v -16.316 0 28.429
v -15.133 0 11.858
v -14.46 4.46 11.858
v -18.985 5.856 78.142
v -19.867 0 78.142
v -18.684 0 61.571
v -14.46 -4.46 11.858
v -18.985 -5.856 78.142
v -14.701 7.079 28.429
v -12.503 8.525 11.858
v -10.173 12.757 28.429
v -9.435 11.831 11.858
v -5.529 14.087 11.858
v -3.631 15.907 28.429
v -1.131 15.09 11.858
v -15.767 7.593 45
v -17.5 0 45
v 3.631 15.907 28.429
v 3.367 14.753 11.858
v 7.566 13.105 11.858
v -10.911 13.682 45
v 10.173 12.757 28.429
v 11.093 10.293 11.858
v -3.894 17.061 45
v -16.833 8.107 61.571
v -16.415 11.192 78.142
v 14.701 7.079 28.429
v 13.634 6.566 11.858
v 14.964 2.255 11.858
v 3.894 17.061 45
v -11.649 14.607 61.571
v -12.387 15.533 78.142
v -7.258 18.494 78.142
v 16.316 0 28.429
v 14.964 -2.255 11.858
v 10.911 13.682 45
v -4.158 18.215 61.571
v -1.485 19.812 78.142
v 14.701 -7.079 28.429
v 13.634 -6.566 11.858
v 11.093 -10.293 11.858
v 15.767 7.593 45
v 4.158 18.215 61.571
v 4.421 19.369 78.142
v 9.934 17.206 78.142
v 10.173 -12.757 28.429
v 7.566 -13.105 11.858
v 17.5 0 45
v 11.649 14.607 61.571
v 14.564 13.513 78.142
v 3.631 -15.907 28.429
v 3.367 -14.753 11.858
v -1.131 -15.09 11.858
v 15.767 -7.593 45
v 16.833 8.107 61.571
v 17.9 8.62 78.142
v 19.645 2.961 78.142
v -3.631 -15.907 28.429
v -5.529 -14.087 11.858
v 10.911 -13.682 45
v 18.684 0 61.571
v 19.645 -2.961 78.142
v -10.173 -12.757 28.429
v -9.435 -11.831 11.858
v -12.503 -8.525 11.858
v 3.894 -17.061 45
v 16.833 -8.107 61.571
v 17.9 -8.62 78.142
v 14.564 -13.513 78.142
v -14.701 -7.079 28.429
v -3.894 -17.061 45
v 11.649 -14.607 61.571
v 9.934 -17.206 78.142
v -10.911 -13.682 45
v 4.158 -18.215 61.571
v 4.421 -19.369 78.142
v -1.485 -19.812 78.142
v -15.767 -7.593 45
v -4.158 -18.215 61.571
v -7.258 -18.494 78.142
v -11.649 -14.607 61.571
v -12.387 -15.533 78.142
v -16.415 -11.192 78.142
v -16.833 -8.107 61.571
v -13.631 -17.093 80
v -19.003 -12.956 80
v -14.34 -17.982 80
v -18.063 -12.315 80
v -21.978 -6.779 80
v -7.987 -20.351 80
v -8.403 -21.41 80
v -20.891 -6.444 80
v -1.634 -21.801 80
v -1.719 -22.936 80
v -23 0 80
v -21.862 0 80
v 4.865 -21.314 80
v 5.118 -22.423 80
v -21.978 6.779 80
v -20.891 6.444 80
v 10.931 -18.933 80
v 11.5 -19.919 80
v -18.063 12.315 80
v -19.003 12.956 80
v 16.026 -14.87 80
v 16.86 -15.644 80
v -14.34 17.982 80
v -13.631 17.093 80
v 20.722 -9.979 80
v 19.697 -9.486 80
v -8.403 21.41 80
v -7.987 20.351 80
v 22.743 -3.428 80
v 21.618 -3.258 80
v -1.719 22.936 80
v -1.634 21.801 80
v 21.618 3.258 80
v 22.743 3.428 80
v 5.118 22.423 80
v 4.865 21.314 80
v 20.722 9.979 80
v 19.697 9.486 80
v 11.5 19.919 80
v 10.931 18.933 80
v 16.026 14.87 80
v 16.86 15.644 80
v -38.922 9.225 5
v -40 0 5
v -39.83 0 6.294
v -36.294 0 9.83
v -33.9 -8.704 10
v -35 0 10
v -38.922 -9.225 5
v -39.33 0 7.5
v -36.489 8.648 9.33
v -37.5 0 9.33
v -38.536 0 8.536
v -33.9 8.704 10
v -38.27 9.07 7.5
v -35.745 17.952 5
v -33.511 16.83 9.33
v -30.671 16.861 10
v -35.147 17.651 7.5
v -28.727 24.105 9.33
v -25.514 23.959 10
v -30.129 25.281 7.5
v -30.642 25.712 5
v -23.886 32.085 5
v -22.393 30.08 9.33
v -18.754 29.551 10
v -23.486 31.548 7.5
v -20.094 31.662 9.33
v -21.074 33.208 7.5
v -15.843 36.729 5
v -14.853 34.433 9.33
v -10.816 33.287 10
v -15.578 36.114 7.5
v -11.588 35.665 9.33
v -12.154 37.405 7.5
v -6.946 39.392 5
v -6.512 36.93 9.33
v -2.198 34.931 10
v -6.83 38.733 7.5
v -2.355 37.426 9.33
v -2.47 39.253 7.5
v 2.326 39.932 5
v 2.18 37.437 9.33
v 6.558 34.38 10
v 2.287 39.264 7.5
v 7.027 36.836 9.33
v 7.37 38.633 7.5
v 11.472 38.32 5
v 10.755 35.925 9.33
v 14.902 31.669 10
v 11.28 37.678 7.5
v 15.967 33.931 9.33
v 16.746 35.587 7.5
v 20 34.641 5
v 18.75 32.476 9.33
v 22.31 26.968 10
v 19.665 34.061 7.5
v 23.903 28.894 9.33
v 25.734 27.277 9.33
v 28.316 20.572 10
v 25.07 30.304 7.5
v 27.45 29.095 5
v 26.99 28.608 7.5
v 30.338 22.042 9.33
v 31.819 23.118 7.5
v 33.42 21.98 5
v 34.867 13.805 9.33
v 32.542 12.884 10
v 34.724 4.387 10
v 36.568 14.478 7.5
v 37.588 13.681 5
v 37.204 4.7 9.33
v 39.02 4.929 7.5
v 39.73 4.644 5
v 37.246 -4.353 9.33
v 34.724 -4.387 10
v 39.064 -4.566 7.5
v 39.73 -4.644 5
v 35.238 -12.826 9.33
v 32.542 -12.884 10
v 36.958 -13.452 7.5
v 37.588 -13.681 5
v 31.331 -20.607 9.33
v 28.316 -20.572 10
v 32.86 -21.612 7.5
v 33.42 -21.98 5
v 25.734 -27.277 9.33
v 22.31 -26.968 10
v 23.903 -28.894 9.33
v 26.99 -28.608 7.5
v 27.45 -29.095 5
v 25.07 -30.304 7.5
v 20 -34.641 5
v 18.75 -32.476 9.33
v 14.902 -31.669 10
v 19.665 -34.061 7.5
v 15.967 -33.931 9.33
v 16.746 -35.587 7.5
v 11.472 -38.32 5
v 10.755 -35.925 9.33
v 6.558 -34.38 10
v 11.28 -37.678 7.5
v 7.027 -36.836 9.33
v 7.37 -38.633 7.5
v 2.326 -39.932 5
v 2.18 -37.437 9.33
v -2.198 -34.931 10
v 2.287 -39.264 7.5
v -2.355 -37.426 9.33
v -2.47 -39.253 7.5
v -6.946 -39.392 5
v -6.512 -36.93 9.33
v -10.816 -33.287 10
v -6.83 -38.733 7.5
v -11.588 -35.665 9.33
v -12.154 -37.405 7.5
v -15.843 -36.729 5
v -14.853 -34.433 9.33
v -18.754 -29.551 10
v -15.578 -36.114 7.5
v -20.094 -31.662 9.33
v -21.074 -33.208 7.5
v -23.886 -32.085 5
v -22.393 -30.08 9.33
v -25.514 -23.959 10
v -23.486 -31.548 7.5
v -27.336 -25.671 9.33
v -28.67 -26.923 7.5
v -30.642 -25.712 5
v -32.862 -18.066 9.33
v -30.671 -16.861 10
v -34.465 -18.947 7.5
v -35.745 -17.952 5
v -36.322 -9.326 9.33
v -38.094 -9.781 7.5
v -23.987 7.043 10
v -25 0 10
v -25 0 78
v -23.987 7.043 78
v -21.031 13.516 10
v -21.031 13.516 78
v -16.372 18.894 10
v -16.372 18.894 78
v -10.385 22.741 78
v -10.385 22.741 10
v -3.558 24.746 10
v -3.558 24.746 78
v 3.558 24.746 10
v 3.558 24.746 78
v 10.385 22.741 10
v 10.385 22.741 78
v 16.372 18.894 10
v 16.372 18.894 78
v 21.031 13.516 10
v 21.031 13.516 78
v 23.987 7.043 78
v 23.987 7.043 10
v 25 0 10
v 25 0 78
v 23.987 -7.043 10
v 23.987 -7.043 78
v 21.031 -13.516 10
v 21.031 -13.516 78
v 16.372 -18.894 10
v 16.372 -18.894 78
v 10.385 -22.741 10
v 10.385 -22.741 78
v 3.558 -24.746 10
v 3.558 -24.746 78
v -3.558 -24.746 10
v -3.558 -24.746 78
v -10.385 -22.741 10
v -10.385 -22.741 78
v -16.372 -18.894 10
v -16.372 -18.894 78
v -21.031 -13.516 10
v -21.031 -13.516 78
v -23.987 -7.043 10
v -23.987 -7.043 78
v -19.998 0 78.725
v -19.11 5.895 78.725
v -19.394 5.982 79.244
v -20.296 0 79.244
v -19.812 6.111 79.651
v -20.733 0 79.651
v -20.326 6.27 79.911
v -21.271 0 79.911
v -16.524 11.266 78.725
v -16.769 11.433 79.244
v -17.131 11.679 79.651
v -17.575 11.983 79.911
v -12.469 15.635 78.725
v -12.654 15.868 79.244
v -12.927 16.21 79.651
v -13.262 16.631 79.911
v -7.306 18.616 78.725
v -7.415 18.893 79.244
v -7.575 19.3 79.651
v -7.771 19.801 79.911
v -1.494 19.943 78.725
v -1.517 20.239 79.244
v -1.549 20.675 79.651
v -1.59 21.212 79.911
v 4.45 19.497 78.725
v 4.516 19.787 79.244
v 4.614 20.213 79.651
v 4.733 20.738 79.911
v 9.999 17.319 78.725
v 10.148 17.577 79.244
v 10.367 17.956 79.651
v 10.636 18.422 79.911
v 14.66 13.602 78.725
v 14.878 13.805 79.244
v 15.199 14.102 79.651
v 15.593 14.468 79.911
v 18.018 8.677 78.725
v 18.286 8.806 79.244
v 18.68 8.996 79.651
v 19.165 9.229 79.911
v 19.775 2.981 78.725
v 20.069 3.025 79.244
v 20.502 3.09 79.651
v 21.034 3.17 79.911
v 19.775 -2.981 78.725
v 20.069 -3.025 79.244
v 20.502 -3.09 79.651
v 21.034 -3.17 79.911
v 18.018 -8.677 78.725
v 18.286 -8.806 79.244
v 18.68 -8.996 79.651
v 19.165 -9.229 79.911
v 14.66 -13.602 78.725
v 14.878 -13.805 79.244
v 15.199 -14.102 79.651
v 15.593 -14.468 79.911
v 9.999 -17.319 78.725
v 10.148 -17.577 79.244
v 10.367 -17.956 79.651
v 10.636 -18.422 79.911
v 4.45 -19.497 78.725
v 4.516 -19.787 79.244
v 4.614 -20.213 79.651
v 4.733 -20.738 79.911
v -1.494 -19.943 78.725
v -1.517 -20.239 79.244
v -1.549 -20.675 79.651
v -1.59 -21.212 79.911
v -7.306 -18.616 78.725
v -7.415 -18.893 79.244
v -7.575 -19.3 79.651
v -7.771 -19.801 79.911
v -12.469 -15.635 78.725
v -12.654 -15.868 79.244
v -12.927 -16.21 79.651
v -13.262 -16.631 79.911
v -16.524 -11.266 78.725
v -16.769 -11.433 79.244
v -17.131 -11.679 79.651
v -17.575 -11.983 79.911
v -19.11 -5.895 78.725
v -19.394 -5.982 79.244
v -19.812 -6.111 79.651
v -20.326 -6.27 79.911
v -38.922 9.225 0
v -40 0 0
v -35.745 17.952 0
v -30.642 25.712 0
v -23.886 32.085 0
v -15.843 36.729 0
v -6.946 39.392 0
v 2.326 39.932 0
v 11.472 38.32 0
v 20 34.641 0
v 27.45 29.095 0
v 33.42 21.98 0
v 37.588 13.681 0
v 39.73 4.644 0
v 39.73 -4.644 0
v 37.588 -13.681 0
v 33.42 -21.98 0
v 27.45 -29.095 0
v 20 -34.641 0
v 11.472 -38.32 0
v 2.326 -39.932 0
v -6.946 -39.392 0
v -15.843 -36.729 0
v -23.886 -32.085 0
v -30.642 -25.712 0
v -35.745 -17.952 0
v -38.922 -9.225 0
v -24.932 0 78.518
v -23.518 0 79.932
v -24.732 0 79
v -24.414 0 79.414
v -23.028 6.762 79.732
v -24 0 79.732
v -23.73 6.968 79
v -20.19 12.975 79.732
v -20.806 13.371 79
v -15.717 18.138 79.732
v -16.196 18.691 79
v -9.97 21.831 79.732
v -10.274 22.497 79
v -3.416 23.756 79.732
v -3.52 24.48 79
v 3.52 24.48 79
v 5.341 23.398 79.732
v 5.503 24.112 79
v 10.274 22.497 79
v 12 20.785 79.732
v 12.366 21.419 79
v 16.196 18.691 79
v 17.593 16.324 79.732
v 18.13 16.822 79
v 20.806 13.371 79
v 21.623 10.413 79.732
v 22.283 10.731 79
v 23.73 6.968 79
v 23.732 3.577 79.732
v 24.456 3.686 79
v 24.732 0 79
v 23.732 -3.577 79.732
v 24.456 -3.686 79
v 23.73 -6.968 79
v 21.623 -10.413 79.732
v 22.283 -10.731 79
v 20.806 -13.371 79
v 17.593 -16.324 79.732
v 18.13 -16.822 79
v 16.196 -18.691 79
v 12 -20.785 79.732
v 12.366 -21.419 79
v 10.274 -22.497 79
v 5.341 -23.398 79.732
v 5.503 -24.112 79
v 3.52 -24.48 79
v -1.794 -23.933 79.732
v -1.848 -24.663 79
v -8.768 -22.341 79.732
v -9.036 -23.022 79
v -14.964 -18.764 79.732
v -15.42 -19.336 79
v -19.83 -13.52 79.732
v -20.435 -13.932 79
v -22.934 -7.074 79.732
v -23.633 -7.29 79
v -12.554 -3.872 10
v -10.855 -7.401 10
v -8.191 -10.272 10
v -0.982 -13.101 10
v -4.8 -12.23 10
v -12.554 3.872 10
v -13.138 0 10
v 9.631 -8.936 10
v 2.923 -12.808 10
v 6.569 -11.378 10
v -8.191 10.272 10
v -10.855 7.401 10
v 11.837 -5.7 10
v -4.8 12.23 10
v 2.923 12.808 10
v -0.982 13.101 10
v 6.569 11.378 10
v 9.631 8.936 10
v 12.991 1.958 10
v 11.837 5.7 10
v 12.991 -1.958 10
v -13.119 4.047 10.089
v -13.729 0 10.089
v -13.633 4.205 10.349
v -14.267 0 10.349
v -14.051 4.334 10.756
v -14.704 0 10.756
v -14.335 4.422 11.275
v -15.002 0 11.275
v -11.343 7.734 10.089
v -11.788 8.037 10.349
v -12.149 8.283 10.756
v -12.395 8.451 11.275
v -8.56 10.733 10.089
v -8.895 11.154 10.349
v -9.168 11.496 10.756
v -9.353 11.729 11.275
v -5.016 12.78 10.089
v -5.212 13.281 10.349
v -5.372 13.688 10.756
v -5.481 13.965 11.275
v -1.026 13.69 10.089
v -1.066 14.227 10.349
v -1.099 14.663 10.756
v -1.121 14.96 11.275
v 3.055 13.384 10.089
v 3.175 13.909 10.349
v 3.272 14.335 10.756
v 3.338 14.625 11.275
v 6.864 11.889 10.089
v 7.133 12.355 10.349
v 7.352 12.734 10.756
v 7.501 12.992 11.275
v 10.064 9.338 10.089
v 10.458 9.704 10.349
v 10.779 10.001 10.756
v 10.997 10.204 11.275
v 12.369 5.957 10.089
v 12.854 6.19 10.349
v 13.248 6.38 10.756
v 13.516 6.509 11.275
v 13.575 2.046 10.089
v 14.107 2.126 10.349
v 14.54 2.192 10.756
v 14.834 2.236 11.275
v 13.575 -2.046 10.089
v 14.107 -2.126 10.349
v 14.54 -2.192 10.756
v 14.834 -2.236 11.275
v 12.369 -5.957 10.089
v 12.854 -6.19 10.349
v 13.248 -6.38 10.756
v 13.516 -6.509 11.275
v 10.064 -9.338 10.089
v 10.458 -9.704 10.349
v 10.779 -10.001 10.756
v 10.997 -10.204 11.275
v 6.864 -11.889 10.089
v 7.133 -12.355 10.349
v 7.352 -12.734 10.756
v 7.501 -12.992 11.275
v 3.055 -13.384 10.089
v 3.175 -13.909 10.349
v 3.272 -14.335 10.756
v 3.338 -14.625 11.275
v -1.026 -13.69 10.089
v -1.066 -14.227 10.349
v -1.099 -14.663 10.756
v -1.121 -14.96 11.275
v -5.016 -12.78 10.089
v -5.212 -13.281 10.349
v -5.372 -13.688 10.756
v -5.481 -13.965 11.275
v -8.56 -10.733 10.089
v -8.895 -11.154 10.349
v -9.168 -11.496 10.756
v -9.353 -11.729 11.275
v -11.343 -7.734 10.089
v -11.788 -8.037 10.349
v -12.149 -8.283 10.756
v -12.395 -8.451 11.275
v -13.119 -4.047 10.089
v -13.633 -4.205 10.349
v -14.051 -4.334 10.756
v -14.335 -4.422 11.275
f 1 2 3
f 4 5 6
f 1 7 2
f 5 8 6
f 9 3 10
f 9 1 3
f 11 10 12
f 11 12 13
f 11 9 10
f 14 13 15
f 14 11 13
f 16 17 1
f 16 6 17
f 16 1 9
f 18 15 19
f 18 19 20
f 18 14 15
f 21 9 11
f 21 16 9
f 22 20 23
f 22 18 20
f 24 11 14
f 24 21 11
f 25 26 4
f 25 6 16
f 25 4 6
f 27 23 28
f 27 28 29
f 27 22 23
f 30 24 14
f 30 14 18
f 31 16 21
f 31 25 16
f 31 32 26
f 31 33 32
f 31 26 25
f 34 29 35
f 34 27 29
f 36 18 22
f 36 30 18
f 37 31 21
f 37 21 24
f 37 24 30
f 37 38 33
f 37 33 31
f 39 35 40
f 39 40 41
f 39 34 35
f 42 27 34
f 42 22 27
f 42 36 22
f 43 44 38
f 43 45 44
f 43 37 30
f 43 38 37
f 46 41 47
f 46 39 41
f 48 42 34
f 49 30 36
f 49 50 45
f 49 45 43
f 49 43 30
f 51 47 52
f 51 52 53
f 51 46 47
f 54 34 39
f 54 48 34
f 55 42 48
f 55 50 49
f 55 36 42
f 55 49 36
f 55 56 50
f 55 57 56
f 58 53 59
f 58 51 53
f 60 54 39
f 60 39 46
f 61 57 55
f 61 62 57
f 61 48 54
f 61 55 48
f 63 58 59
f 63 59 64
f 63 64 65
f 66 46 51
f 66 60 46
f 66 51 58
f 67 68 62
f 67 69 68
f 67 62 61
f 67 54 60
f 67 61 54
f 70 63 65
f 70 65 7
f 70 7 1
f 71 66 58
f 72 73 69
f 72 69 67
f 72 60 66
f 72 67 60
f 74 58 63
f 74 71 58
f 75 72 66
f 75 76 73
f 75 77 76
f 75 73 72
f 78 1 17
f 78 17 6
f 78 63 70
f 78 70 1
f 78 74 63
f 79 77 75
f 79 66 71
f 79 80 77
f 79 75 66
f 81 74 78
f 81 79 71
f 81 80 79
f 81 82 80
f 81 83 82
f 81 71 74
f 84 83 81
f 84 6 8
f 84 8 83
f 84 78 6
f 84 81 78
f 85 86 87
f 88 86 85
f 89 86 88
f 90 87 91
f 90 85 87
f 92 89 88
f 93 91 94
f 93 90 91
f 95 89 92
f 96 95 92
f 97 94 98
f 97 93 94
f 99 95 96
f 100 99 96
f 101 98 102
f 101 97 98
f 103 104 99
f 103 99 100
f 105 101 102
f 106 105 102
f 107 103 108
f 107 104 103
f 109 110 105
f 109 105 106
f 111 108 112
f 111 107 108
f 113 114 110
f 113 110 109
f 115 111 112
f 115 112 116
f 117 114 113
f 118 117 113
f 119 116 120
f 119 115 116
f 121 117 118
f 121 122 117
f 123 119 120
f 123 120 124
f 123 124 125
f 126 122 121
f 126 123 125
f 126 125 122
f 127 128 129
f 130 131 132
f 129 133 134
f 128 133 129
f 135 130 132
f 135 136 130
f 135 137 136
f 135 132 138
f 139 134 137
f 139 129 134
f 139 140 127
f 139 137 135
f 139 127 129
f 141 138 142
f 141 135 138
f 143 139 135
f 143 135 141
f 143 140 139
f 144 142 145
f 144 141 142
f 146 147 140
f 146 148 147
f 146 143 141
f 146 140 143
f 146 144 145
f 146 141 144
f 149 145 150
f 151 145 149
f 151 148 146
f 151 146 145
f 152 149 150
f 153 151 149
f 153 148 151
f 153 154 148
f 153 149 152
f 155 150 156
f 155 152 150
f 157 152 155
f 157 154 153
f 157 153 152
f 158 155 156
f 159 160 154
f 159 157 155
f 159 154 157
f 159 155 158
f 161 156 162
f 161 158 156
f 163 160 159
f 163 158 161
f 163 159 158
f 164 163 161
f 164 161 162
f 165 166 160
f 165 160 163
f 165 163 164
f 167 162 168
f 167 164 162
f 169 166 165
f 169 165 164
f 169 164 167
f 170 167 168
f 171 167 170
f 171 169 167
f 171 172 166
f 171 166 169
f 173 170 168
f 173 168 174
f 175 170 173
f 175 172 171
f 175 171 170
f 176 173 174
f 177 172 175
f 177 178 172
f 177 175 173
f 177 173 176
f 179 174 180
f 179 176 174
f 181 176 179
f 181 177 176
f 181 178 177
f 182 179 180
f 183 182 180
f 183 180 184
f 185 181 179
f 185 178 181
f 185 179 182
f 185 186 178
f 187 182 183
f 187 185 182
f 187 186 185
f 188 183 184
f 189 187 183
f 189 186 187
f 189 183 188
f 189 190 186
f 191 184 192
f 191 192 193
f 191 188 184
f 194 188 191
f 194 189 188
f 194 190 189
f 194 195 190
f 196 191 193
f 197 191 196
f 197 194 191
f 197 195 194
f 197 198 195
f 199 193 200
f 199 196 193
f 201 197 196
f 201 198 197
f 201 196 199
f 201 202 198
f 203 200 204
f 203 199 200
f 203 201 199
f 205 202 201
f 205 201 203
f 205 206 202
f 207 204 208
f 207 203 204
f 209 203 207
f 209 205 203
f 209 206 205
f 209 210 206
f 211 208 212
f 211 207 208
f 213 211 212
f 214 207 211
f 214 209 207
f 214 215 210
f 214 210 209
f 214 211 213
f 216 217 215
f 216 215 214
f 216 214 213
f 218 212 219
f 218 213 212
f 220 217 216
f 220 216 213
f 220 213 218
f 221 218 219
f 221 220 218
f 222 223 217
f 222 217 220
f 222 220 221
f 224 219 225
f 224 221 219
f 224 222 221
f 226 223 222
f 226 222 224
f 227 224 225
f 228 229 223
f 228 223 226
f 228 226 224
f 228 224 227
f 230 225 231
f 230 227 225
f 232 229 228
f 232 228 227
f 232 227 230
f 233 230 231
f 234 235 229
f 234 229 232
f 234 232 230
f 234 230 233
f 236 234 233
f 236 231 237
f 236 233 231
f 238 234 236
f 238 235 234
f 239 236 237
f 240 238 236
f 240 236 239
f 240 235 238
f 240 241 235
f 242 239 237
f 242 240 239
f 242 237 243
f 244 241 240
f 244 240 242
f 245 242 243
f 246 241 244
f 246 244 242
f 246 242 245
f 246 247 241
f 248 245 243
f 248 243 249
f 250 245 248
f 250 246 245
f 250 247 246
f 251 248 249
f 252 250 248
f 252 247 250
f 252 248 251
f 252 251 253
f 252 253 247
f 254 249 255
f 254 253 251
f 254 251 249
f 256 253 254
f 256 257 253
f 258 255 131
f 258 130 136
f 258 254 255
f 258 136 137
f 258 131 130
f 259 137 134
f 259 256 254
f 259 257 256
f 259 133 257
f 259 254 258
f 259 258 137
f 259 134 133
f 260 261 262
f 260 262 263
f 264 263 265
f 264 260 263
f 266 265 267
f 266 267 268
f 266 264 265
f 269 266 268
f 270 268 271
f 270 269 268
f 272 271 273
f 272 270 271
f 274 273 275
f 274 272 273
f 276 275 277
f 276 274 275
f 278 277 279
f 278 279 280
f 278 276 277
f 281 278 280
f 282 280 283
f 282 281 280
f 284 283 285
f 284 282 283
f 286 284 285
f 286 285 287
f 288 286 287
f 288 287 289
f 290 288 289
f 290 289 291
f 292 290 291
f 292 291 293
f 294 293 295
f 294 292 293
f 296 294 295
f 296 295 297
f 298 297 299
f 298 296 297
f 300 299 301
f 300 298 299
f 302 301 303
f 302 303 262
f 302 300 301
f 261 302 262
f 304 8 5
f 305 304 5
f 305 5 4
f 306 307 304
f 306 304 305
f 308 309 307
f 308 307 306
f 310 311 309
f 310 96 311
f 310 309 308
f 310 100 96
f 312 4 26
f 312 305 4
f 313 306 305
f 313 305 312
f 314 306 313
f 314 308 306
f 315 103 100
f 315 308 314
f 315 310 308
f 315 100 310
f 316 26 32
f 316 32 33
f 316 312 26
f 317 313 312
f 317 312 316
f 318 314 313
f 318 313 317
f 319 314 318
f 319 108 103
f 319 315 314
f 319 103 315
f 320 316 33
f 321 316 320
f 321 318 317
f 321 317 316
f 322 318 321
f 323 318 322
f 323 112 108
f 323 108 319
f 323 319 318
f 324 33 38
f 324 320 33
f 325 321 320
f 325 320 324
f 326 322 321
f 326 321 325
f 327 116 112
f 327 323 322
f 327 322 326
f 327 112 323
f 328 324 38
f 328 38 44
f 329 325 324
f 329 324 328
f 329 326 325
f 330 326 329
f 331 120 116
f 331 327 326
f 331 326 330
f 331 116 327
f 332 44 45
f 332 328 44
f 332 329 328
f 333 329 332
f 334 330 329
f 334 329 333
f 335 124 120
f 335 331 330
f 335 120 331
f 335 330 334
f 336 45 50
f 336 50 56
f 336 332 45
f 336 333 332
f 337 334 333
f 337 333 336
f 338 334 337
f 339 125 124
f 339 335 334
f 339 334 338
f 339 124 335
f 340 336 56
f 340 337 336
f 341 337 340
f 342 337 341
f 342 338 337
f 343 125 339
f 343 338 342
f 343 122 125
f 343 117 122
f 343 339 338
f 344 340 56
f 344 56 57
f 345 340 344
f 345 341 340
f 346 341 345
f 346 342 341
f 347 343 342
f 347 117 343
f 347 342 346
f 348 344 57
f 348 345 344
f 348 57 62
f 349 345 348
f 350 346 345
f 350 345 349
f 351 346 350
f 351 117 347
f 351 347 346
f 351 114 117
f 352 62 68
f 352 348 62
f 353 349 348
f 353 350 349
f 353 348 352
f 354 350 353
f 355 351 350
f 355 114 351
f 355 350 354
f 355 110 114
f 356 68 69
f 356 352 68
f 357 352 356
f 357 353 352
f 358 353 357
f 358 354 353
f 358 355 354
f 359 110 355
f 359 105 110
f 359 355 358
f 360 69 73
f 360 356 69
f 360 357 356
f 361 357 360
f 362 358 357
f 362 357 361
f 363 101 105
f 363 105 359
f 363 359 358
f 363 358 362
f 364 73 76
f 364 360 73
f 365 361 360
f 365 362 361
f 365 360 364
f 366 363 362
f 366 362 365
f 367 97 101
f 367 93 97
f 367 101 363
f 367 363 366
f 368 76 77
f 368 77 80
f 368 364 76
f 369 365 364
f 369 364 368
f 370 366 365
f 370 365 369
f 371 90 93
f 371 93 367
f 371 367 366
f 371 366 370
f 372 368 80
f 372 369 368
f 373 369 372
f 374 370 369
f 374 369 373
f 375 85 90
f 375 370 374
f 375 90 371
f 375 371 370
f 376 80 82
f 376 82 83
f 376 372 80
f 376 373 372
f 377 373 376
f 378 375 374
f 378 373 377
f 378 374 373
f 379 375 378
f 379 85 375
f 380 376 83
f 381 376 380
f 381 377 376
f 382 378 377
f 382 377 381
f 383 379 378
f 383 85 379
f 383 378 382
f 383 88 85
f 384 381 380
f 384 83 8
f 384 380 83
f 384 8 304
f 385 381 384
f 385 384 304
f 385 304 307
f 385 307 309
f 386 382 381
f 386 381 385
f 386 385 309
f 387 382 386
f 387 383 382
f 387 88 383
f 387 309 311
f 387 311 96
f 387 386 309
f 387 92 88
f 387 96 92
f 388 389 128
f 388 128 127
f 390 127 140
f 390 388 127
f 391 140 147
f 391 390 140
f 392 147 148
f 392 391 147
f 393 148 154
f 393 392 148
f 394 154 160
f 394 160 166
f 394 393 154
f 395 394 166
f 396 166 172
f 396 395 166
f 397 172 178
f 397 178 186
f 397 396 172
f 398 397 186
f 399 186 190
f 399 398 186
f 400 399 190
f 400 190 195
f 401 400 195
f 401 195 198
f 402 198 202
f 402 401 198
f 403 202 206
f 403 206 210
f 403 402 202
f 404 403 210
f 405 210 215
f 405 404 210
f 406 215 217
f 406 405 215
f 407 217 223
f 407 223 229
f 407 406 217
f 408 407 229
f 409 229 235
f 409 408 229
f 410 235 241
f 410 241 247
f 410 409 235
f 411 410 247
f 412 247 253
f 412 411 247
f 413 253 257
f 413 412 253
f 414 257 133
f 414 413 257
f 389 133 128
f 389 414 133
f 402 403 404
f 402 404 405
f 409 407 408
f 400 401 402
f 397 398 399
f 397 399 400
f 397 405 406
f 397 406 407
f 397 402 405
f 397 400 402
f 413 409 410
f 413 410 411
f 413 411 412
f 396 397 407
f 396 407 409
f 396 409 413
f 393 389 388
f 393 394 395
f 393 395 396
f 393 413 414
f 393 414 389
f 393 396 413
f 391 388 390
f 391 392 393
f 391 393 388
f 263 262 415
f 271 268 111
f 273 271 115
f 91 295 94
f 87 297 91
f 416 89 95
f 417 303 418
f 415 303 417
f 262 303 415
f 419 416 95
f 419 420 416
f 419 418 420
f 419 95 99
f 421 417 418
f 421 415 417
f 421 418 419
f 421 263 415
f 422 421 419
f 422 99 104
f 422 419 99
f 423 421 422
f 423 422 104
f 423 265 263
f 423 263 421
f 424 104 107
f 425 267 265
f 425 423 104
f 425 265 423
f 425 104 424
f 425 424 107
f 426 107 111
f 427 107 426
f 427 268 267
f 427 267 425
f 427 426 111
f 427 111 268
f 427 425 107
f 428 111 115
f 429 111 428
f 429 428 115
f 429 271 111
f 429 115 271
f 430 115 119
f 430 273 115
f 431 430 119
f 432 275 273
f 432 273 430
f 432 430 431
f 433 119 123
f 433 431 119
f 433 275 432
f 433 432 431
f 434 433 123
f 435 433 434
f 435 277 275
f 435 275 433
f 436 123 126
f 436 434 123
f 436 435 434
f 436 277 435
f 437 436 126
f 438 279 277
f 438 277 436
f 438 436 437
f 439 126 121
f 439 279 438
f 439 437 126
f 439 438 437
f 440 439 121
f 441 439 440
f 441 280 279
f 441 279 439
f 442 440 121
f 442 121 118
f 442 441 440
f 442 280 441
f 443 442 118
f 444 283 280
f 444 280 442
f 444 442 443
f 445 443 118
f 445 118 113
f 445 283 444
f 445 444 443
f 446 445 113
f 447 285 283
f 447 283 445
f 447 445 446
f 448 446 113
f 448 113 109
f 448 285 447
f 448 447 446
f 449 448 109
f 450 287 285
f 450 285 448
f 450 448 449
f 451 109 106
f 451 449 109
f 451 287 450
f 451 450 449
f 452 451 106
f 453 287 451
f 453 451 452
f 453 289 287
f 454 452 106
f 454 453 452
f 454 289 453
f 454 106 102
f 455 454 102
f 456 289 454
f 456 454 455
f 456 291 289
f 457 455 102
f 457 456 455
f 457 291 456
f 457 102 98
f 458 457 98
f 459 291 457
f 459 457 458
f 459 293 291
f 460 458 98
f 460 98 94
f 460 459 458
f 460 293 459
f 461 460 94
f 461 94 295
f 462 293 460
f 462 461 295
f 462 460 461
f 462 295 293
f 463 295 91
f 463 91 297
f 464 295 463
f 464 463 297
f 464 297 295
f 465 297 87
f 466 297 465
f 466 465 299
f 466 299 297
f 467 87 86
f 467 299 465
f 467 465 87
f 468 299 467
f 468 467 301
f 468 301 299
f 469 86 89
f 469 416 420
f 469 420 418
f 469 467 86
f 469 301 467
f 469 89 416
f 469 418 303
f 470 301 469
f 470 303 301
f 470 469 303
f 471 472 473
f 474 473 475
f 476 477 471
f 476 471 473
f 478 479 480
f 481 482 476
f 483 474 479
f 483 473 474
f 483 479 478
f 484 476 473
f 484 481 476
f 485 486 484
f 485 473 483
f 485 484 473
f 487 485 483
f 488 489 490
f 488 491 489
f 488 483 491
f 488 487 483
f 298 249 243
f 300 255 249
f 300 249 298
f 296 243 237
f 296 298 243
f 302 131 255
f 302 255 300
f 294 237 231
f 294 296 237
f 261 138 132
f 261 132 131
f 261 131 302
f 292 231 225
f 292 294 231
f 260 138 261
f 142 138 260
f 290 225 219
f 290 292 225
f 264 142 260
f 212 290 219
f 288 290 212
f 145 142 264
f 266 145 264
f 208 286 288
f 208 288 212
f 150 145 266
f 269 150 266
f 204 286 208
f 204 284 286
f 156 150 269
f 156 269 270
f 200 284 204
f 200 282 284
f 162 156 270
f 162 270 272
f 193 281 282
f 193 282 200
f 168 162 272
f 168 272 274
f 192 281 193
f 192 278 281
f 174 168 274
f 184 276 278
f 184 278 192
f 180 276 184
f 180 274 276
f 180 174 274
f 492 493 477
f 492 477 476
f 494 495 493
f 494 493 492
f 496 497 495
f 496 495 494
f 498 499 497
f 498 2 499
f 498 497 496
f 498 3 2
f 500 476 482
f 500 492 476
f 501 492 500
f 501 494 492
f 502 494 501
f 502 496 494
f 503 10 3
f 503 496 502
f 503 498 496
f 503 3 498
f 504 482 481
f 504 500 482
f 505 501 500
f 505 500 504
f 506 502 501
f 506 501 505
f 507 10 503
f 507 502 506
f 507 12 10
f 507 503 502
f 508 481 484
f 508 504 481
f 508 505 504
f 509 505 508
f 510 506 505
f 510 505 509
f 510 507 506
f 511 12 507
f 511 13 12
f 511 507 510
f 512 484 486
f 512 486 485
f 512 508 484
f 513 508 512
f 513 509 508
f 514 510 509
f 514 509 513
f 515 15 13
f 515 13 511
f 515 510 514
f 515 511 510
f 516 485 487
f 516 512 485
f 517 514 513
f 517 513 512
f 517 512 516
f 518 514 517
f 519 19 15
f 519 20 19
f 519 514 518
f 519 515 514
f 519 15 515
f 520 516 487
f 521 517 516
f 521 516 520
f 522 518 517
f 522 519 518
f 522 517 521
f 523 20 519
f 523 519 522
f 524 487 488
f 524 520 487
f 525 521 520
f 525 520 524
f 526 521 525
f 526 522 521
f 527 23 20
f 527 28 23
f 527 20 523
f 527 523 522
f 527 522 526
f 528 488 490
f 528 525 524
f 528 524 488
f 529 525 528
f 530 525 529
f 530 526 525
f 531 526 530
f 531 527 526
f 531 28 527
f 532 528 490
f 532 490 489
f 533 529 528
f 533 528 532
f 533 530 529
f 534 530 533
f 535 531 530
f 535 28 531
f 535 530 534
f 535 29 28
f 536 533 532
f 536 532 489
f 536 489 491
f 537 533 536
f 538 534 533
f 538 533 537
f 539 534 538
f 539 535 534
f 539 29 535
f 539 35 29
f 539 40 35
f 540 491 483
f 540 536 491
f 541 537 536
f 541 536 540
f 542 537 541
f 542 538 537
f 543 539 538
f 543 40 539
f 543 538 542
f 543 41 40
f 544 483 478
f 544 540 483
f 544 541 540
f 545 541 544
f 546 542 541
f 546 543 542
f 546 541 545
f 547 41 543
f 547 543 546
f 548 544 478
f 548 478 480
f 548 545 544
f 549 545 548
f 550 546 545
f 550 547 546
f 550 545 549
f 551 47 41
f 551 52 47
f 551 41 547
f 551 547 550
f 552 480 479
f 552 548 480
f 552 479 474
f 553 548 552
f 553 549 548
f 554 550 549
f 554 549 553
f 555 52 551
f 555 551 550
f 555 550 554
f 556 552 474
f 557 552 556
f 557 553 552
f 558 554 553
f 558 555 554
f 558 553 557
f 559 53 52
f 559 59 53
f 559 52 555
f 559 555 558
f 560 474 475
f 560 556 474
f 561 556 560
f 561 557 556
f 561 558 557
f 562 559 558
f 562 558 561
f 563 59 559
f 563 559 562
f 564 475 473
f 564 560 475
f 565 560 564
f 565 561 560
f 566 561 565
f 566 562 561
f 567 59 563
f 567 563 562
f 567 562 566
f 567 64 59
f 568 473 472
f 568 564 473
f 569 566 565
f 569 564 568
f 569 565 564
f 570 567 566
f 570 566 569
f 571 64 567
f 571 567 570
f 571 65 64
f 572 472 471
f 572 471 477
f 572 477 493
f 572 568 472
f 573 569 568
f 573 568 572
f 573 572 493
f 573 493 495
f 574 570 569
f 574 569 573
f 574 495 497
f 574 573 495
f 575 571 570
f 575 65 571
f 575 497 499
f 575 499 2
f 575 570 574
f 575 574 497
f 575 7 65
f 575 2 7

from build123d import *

# Parameters (mm, degrees)
F2_R = 2
F3_R = 5


with BuildPart() as f1:
    # F0 (on Front) → F1 (revolve)
    with BuildSketch(Plane.XZ):
        Polygon((-40, 0), (0, 0), (0, 10), (-15, 10), (-20, 80), (-25, 80), (-25, 10), (-40, 10), align=None)
    revolve(axis=Axis((0, 0, 5), (0, 0, -1)))

    # F2
    f2_edges = [f1.edges().sort_by_distance(p)[0] for p in [
        (15, 0, 10),
        (20, 0, 80),
        (25, 0, 80),
    ]]
    fillet(f2_edges, radius=F2_R)

    # F3
    f3_edges = [f1.edges().sort_by_distance(p)[0] for p in [
        (40, 0, 10),
    ]]
    fillet(f3_edges, radius=F3_R)


solid = f1.part
